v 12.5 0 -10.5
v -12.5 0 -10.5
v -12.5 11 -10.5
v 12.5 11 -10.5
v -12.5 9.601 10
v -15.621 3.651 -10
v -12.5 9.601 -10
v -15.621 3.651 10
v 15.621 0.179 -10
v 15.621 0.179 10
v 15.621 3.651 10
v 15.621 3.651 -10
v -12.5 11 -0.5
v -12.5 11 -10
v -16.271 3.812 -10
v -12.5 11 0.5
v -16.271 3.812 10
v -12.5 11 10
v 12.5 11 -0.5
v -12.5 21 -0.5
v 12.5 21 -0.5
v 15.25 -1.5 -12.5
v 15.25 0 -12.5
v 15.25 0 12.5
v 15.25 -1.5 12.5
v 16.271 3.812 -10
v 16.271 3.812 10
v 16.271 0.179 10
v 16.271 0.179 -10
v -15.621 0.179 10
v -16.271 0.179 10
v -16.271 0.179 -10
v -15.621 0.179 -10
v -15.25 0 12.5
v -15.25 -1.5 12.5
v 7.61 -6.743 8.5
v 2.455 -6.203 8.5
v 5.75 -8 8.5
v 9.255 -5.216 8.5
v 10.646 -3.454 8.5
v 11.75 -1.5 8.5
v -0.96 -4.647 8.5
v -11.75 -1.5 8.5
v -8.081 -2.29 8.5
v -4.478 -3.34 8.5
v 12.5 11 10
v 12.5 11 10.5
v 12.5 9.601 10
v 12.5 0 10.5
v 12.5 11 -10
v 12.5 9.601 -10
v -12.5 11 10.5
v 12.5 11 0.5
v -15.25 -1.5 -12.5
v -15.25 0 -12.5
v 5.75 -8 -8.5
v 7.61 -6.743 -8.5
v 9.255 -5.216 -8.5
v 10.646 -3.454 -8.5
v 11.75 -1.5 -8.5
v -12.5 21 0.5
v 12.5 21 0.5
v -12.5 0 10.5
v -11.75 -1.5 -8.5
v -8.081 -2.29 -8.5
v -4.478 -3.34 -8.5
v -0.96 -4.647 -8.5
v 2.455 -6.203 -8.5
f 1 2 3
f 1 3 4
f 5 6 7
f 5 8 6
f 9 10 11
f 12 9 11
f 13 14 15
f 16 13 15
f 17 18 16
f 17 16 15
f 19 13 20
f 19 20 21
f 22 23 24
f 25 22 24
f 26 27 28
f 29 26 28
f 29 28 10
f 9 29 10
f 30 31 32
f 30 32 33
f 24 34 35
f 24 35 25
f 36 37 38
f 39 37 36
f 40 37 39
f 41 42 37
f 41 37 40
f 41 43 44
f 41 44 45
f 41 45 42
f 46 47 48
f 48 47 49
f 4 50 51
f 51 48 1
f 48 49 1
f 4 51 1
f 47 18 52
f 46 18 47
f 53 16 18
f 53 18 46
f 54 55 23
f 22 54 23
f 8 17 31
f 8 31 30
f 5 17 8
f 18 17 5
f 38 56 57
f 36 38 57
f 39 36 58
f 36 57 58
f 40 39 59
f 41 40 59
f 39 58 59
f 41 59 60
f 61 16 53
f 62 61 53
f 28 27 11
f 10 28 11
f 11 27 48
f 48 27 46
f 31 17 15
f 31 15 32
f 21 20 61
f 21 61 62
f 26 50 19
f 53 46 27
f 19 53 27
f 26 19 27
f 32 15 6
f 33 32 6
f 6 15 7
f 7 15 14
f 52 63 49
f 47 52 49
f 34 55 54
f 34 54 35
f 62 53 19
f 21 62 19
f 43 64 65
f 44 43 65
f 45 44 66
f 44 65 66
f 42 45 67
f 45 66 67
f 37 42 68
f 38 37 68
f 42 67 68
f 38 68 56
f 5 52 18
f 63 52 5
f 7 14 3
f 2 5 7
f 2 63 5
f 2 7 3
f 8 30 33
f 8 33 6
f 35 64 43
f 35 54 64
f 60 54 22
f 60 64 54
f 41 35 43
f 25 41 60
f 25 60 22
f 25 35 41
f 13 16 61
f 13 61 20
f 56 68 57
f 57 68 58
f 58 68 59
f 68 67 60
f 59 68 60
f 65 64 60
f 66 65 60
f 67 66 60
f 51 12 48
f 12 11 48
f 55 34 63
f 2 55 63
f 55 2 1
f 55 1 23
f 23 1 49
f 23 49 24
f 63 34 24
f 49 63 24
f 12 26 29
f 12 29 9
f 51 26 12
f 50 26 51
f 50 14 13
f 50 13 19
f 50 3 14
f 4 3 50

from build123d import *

# Parameters (mm, degrees)
SKETCH1_W                = 25
SKETCH1_H                = 21
BOSS_EXTRUDE1_DEPTH      = 11
SKETCH2_W                = 25
SKETCH2_H                = 1
BOSS_EXTRUDE2_DEPTH      = 10
BOSS_EXTRUDE3_DEPTH      = 10
SKETCH4_W                = 30.5
SKETCH4_H                = 25
BOSS_EXTRUDE4_DEPTH      = 1.5
BOSS_EXTRUDE5_DEPTH      = 8.5
BOSS_EXTRUDE5_DEPTH_BACK = 8.5


with BuildPart() as part:
    # Sketch1 → Boss-Extrude1 (new body)
    with BuildSketch(Plane(origin=(0, 0, 0), x_dir=(1, 0, 0), z_dir=(0, 1, 0))):
        Rectangle(SKETCH1_W, SKETCH1_H)
    extrude(amount=BOSS_EXTRUDE1_DEPTH)

    # Sketch2 → Boss-Extrude2 (add)
    with BuildSketch(Plane(origin=(0, 11, 0), x_dir=(1, 0, 0), z_dir=(0, 1, 0))):
        Rectangle(SKETCH2_W, SKETCH2_H)
    extrude(amount=BOSS_EXTRUDE2_DEPTH)

    # Sketch3 → Boss-Extrude3 (add, symmetric)
    with BuildSketch(Plane.XY):
        Polygon((-12.5, 11), (-16.271420935, 3.81152577), (-16.271420935, 0.178717712), (-15.621420935, 0.178717712), (-15.621420935, 3.651367103), (-12.5, 9.600916182), align=None)
    boss_extrude3 = extrude(amount=BOSS_EXTRUDE3_DEPTH, both=True)

    # Mirror1: Boss-Extrude3 across plane
    add(boss_extrude3.mirror(Plane(origin=(0, 0, 0), x_dir=(0, 0, 1), z_dir=(1, 0, 0))))

    # Sketch4 → Boss-Extrude4 (add)
    with BuildSketch(Plane.XZ):
        Rectangle(SKETCH4_W, SKETCH4_H)
    extrude(amount=BOSS_EXTRUDE4_DEPTH)

    # Sketch5 → Boss-Extrude5 (add, two sides: drawn at the far end of the back side and taken through both)
    with BuildSketch(Plane.XY.offset(-BOSS_EXTRUDE5_DEPTH_BACK)):
        with BuildLine():
            Line((11.75, -1.5), (-11.75, -1.5))
            ThreePointArc((-11.75, -1.5), (-2.707390064, -3.962204019), (5.75, -8))
            ThreePointArc((5.75, -8), (9.254540353, -5.215729557), (11.75, -1.5))
        make_face()
    extrude(amount=BOSS_EXTRUDE5_DEPTH + BOSS_EXTRUDE5_DEPTH_BACK)


solid = part.part
